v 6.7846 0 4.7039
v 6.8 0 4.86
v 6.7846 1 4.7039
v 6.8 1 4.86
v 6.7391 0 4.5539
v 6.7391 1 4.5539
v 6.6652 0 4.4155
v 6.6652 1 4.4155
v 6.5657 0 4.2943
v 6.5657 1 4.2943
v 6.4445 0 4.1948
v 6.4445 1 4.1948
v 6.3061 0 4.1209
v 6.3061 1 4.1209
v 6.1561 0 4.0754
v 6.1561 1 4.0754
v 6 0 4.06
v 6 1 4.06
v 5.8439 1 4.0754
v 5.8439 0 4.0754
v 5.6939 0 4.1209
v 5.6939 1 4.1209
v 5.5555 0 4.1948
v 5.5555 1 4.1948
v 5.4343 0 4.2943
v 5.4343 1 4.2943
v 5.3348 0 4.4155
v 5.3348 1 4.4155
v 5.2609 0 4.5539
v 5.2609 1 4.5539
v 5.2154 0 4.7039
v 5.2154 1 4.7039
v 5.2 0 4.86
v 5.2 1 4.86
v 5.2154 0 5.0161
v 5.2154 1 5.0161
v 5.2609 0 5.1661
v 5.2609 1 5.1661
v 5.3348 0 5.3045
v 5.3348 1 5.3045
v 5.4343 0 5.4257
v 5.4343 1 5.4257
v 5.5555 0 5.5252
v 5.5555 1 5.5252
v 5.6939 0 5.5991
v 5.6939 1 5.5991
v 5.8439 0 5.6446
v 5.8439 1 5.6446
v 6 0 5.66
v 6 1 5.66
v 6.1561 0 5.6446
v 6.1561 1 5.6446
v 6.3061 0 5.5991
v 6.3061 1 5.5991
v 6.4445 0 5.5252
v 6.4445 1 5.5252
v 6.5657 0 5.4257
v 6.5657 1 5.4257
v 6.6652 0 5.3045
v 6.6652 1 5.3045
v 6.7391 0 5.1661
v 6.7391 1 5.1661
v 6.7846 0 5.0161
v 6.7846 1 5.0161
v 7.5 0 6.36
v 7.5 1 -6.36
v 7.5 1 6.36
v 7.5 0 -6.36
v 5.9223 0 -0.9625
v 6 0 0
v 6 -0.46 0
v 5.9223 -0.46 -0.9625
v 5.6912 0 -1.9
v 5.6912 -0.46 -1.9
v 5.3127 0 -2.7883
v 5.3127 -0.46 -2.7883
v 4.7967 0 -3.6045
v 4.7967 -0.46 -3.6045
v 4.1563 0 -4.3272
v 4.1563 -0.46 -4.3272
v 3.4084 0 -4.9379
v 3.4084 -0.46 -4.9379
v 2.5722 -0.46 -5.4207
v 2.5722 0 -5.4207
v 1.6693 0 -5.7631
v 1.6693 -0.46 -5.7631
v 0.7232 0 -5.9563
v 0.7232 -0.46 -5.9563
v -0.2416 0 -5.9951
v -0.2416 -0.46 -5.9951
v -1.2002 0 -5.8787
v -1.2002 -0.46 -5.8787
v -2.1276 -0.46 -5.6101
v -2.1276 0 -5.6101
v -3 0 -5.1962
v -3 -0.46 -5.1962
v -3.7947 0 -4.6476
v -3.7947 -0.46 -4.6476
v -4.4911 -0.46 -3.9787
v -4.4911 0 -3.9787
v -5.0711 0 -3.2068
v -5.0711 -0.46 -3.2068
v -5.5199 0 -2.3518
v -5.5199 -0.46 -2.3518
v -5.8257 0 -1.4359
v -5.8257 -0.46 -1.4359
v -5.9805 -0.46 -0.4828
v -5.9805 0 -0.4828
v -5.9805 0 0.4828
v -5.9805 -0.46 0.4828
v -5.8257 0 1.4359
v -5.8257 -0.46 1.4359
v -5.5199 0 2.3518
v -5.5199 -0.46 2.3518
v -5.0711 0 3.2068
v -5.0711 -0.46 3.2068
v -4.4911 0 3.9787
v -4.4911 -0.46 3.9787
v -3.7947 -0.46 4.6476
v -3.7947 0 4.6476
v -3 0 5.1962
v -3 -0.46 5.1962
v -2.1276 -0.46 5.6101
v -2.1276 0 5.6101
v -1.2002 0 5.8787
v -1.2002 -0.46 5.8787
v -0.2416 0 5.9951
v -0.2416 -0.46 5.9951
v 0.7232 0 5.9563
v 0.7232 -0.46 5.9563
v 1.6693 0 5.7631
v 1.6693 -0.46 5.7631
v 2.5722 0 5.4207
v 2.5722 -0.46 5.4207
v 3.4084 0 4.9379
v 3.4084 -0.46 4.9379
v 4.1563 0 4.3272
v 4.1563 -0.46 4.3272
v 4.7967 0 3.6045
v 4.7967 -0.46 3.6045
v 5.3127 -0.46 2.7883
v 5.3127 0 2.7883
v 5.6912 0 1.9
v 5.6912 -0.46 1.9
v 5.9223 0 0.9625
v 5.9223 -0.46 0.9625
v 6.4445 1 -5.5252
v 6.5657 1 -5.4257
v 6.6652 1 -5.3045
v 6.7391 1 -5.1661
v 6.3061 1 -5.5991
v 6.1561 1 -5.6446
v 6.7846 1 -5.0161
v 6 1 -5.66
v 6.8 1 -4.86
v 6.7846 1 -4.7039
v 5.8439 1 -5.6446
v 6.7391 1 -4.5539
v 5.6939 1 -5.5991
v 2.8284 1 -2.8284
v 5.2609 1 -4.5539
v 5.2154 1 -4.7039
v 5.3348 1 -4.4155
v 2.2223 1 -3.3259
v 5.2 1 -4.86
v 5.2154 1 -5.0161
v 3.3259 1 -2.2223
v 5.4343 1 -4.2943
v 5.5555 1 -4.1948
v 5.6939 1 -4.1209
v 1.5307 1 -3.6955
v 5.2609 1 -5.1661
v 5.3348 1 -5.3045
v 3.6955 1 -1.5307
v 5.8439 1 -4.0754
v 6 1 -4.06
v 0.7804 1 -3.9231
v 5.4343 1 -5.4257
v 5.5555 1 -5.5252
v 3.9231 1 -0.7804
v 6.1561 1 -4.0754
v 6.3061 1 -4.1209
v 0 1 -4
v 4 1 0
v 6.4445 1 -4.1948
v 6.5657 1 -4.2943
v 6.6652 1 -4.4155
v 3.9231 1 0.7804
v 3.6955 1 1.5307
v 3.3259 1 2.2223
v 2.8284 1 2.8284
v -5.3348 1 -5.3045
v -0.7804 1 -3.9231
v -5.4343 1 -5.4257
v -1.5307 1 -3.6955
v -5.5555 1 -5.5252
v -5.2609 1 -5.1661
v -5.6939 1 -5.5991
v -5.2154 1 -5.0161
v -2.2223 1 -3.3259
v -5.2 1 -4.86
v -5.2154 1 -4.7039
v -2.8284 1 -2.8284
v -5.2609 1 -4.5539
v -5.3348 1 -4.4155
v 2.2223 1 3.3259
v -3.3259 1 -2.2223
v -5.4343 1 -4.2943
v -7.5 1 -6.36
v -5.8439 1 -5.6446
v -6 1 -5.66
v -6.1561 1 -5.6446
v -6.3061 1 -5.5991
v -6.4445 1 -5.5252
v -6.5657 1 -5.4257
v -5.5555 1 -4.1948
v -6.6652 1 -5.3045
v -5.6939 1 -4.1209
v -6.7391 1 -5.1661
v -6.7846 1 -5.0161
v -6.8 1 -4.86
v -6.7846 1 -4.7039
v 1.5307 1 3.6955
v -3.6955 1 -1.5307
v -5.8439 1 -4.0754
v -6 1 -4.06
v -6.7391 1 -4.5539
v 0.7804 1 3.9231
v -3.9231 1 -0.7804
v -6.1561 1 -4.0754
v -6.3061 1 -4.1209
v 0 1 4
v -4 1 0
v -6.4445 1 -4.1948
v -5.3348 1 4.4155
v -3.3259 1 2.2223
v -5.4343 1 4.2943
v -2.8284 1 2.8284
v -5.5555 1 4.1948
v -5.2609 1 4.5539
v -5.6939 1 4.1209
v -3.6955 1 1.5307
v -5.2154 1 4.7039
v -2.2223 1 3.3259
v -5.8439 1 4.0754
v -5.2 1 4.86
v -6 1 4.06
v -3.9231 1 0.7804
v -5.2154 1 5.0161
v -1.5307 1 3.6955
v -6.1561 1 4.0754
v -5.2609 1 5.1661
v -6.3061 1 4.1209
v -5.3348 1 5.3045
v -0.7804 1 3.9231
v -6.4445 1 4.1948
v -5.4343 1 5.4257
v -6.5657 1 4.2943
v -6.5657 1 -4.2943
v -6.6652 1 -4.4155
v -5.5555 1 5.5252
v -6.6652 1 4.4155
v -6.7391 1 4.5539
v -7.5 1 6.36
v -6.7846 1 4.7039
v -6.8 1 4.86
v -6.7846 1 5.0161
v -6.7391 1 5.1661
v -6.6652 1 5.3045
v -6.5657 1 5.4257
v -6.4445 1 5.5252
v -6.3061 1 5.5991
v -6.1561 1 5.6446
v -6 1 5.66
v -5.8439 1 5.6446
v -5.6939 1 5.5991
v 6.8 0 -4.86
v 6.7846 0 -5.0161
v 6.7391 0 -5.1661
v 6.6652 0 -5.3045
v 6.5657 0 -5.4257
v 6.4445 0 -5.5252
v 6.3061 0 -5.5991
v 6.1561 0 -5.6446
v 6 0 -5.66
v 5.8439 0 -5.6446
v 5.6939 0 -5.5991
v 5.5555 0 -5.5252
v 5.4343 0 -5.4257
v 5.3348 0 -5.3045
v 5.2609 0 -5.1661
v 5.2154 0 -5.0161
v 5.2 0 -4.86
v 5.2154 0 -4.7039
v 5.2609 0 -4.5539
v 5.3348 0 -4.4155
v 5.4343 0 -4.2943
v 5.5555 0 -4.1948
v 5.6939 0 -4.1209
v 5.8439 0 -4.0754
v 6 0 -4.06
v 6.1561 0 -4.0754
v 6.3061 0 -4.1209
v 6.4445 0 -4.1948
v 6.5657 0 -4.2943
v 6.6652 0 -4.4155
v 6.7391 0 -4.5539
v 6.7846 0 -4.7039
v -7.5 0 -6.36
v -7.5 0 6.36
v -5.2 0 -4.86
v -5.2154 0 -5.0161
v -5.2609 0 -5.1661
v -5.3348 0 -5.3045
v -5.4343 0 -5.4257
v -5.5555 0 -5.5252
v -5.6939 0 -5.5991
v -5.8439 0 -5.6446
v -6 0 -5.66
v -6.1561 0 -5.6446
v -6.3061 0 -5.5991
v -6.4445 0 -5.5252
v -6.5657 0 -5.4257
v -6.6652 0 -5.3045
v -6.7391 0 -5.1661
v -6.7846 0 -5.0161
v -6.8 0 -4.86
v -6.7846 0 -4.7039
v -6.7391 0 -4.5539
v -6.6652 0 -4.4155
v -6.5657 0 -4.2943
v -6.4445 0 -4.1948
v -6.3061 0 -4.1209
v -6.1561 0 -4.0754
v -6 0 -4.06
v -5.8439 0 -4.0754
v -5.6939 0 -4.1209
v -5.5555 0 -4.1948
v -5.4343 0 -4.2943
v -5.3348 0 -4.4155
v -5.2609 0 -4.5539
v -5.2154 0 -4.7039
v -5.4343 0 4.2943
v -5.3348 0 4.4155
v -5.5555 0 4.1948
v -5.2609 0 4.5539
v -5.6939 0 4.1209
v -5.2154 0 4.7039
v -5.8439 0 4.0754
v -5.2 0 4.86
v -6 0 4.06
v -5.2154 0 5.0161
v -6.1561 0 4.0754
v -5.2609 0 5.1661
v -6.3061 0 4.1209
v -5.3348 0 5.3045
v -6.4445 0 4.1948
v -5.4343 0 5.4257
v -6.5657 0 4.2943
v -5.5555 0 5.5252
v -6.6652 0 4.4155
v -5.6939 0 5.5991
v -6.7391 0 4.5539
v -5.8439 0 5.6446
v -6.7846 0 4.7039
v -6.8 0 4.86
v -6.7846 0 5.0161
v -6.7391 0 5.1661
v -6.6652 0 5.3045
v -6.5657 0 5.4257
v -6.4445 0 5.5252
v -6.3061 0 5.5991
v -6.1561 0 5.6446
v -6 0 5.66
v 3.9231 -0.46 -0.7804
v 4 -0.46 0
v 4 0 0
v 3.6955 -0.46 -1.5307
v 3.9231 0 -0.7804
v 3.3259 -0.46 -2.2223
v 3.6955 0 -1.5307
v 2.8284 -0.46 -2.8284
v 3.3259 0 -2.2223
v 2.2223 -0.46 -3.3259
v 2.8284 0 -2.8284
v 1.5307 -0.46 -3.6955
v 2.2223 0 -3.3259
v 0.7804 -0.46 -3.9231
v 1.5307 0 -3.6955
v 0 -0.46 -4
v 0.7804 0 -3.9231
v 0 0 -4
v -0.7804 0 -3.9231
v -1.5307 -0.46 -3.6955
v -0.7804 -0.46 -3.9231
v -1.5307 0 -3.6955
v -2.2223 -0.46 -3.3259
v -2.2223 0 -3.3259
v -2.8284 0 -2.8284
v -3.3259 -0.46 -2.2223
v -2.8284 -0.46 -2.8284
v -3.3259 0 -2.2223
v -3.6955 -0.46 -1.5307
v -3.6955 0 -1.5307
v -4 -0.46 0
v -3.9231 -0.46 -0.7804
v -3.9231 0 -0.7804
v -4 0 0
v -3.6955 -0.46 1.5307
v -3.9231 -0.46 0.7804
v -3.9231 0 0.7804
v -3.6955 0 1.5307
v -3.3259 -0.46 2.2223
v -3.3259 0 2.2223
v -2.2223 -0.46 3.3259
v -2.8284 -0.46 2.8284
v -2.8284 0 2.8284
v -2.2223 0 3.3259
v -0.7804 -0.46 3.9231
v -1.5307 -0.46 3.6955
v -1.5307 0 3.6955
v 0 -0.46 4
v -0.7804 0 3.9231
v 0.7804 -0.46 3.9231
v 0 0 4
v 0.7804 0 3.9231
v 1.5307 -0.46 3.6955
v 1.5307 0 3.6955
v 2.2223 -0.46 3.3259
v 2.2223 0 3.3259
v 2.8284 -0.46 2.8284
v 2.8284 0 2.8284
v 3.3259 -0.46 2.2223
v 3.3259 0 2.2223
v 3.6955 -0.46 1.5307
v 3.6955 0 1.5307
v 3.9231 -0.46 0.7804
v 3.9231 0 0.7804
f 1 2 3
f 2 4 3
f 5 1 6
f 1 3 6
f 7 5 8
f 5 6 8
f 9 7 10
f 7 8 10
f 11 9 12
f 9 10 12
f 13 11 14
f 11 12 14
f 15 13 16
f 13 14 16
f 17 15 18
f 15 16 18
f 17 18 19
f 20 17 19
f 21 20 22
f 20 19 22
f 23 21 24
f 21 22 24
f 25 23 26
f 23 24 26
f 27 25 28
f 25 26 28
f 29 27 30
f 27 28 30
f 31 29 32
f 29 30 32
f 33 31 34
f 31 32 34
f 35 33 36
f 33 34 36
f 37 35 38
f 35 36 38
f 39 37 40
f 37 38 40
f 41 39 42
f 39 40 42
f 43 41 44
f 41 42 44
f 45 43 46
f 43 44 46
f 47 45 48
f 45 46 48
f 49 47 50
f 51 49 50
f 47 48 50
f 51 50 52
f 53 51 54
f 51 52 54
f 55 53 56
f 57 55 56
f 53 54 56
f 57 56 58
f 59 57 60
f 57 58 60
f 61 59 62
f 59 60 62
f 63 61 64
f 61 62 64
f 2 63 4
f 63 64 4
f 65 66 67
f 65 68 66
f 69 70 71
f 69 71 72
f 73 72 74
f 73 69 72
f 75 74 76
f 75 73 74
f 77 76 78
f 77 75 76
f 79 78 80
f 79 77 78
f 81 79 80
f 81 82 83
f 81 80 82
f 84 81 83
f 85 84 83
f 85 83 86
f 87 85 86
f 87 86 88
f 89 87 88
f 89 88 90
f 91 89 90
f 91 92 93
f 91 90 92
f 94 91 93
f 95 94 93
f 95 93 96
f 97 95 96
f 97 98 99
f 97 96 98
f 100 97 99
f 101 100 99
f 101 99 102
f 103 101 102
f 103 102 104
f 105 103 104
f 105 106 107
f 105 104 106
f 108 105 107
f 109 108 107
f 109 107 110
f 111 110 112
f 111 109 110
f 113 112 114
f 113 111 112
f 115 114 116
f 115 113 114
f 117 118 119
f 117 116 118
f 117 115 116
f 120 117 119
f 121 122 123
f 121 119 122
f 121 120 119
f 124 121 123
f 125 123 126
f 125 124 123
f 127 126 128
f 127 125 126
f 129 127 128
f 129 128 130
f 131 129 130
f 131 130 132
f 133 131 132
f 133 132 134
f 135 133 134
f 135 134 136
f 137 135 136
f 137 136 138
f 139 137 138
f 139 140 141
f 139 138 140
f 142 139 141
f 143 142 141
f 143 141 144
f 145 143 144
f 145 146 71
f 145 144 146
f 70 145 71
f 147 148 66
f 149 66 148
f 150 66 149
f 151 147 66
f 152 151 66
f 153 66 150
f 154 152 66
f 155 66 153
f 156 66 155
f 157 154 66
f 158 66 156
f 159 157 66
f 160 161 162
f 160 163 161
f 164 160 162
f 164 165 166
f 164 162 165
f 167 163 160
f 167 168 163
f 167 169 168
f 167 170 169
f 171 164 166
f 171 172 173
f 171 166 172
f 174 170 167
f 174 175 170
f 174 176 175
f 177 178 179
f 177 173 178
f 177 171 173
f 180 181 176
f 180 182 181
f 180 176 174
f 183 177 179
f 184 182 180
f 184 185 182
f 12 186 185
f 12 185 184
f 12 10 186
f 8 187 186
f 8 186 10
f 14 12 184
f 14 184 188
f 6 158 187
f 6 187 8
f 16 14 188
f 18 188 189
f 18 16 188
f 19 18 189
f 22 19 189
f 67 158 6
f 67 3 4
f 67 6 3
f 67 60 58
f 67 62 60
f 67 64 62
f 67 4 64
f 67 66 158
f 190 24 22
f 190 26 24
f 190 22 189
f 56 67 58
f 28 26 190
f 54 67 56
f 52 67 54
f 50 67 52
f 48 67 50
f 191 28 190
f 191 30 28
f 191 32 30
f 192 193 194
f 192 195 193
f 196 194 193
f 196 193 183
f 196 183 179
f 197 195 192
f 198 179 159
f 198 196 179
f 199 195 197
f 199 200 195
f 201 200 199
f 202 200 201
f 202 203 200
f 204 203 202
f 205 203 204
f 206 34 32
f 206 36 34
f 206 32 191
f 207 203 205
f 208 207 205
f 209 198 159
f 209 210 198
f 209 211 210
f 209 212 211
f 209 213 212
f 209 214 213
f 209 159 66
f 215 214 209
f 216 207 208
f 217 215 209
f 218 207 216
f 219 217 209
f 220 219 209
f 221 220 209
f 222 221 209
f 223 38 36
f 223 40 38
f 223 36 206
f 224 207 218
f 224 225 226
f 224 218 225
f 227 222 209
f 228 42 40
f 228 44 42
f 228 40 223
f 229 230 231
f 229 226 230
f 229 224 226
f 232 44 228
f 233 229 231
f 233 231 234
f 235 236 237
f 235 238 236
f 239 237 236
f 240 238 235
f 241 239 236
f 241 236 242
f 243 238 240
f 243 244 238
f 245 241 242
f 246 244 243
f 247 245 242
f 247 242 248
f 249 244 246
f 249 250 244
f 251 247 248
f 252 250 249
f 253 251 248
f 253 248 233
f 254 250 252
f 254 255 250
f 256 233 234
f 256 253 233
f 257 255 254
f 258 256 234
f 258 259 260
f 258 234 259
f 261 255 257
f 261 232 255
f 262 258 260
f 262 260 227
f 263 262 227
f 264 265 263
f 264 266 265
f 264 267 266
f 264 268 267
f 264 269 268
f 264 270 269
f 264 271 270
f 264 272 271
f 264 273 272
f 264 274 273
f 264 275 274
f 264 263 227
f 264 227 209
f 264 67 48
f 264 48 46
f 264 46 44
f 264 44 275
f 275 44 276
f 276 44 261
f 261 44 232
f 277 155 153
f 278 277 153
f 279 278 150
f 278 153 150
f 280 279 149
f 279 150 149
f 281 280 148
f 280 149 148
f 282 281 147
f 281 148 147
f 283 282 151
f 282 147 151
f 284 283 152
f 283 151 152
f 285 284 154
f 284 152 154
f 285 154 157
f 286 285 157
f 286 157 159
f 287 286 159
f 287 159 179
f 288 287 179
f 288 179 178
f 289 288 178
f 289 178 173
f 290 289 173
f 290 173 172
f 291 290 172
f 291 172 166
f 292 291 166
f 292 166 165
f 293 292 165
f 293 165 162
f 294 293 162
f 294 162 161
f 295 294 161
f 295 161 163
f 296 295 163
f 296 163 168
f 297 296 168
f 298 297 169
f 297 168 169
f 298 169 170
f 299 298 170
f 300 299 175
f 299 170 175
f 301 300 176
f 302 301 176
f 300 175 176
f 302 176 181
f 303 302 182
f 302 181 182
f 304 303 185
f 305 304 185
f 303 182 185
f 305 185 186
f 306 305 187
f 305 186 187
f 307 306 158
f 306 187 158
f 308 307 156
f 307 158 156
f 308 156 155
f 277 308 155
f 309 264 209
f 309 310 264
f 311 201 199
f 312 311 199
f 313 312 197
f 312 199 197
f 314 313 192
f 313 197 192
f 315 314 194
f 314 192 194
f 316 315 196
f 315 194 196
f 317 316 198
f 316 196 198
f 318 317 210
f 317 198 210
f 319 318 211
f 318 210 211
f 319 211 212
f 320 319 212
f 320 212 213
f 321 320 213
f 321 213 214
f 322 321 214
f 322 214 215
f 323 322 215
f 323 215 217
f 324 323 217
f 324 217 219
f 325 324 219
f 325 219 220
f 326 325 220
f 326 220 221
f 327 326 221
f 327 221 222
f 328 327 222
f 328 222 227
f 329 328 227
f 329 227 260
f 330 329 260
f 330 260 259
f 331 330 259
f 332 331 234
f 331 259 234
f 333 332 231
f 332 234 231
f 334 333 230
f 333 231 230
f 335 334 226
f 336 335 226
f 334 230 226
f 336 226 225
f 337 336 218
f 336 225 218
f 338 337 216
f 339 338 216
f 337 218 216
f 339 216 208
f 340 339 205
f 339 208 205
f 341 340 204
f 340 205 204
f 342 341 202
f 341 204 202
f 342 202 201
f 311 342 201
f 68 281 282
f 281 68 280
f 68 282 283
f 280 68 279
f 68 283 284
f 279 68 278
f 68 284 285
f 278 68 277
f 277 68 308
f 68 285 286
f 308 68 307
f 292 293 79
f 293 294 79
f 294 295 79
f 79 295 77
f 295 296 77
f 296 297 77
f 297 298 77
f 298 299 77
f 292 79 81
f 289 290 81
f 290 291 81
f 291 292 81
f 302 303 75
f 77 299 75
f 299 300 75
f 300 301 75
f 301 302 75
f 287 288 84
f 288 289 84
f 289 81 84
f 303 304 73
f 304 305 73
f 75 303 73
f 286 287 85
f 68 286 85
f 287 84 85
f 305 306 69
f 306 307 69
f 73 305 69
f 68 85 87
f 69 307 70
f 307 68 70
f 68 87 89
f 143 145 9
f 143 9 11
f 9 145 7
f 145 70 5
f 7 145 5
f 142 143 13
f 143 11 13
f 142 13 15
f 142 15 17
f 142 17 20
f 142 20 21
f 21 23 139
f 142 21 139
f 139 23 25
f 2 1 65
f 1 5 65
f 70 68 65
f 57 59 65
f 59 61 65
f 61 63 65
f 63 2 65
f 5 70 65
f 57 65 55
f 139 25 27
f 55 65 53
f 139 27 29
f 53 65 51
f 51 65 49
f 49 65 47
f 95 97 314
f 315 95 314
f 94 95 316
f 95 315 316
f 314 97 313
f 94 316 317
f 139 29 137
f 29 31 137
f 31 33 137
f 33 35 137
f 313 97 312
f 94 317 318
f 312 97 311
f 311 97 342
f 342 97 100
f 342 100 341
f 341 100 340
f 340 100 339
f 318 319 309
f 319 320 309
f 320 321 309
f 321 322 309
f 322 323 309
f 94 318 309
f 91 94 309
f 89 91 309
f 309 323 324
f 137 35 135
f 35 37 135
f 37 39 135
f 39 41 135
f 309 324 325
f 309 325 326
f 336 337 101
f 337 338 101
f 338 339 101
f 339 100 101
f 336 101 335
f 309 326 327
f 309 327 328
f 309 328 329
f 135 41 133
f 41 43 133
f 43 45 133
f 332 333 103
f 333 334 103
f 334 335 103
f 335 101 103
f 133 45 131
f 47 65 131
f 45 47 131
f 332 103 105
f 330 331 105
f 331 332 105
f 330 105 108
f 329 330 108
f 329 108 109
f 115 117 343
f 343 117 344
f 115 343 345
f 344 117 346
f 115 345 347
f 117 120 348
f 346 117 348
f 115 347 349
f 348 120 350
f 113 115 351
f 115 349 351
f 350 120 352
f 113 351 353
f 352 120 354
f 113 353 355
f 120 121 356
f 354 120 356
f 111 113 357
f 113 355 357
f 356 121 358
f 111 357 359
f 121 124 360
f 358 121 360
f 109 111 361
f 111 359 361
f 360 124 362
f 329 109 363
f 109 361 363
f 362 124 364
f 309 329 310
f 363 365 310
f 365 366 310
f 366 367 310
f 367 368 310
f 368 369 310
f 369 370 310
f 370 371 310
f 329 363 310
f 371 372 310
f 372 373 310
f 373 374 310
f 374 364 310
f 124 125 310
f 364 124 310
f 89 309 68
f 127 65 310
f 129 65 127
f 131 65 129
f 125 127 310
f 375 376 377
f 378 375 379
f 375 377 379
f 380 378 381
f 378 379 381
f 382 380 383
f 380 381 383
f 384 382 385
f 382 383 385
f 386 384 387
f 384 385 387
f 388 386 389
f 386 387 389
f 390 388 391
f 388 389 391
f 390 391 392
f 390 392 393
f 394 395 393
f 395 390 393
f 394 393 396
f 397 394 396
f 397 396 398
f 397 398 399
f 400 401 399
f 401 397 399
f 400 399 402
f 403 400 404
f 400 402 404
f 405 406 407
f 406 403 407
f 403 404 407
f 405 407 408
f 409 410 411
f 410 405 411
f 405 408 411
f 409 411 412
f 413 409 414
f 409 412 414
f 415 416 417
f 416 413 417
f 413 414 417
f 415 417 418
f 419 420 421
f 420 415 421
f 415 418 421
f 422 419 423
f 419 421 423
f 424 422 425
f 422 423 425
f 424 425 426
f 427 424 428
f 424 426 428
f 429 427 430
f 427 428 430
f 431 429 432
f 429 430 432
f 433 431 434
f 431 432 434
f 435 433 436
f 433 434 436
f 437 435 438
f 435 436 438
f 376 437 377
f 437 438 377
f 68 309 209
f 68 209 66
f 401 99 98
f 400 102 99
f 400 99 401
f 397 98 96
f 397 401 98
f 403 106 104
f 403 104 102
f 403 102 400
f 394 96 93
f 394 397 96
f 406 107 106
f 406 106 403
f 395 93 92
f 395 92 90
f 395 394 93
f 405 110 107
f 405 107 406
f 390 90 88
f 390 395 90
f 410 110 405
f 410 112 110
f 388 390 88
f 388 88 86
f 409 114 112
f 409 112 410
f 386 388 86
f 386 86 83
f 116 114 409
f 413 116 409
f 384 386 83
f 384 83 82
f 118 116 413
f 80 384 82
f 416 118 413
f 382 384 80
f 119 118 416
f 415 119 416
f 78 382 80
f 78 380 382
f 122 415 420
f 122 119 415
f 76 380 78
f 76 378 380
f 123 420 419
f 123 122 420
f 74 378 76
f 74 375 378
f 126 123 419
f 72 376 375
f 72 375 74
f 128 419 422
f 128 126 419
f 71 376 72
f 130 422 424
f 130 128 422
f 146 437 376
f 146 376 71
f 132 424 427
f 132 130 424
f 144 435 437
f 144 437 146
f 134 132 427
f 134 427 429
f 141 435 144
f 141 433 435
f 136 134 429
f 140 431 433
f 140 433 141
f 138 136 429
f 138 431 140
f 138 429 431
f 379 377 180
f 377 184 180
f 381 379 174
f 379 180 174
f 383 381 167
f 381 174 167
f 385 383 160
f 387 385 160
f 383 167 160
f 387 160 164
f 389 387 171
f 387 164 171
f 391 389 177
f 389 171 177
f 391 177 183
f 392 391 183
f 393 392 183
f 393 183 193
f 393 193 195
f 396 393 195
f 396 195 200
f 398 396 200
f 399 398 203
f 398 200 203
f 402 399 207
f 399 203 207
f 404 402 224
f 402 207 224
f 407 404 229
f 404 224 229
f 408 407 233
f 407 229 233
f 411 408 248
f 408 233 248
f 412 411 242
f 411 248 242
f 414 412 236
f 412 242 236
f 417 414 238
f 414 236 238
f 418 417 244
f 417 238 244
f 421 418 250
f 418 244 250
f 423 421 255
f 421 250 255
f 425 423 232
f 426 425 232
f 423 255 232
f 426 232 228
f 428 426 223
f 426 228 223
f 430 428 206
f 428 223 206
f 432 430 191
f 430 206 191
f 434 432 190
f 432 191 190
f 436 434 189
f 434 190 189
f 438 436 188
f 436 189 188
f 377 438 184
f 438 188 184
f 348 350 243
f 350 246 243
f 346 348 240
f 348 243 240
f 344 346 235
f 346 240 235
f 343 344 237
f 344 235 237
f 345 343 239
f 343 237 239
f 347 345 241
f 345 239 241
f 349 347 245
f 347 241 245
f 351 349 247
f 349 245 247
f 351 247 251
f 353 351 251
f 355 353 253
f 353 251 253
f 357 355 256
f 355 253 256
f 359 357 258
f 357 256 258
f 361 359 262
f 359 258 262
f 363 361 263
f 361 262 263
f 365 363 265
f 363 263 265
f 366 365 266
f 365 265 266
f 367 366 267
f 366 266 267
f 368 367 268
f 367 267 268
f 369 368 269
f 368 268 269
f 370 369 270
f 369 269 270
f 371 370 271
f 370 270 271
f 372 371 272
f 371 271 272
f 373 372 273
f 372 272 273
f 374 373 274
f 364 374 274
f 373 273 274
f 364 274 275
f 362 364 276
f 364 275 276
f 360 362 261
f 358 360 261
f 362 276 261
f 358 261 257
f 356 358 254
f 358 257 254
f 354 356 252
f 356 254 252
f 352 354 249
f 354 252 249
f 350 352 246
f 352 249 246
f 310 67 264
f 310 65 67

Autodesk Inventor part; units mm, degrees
ref_plane "YZ Plane" through (0, 0, 0) normal (1, 0, 0) x (0, 1, 0)
ref_plane "XZ Plane" through (0, 0, 0) normal (0, 1, 0) x (-1, 0, 0)
ref_plane "XY Plane" through (0, 0, 0) normal (0, 0, 1) x (1, 0, 0)
sketch "Sketch1" plane through (0, 0, 0) normal (0, 1, 0) x (-1, 0, 0)
  line L0 (-7.5, 6.36) -> (7.5, 6.36)
  line L1 (7.5, 6.36) -> (7.5, -6.36)
  line L2 (7.5, -6.36) -> (-7.5, -6.36)
  line L3 (-7.5, -6.36) -> (-7.5, 6.36)
  line L4 (-7.5, 6.36) -> (7.5, -6.36) construction
  line L5 (7.5, 6.36) -> (-7.5, -6.36) construction
  point P0 (0, 0)
  dimension "d0" = 12.72
  dimension "d1" = 15
extrude "Extrusion1" add sketch "Sketch1" along normal blind 1
sketch "Sketch2" plane through (0, 1, 0) normal (0, 1, 0) x (1, 0, 0)
  circle A0 centre (0, 0) radius 4
  dimension "d4" = 8
extrude "Extrusion2" cut sketch "Sketch2" against normal up to surface (1 mm away)
sketch "Sketch3" plane through (0, 0, 0) normal (0, -1, 0) x (1, 0, 0)
  circle A0 centre (0, 0) radius 4
  circle A1 centre (0, 0) radius 6
  dimension "d7" = 12
  dimension "d8" = 8
extrude "Extrusion3" add sketch "Sketch3" along normal blind 0.46
sketch "Sketch4" plane through (0, 1, 0) normal (0, 1, 0) x (1, 0, 0)
  point P0 (0, 0)
sketch "Sketch5" plane through (0, 1, 0) normal (0, 1, 0) x (1, 0, 0)
  circle A0 centre (-6, -4.86) radius 0.8
  line L0 (-7.5, 6.36) -> (-7.5, -6.36) projected
  line L1 (-7.5, 0) -> (7.5, 0) construction
  line L2 (7.5, -6.36) -> (7.5, 6.36) projected
  line L3 (-7.5, -6.36) -> (7.5, -6.36) projected
  line L4 (0, -6.36) -> (0, 6.36) construction
  line L5 (7.5, 6.36) -> (-7.5, 6.36) projected
  circle A1 centre (-6, 4.86) radius 0.8
  line L6 (0, 6.36) -> (0, -6.36) construction
  circle A2 centre (6, -4.86) radius 0.8
  circle A3 centre (6, 4.86) radius 0.8
  point P0 (0, 0)
  dimension "d11" = 1.5
  dimension "d12" = 1.6
  dimension "d13" = 1.5
extrude "Extrusion4" cut sketch "Sketch5" against normal up to surface (1 mm away) contours A0 | A1 | A2 | A3
properties part number "PinholeFlexFixture" material "Acetal Resin, Black"
